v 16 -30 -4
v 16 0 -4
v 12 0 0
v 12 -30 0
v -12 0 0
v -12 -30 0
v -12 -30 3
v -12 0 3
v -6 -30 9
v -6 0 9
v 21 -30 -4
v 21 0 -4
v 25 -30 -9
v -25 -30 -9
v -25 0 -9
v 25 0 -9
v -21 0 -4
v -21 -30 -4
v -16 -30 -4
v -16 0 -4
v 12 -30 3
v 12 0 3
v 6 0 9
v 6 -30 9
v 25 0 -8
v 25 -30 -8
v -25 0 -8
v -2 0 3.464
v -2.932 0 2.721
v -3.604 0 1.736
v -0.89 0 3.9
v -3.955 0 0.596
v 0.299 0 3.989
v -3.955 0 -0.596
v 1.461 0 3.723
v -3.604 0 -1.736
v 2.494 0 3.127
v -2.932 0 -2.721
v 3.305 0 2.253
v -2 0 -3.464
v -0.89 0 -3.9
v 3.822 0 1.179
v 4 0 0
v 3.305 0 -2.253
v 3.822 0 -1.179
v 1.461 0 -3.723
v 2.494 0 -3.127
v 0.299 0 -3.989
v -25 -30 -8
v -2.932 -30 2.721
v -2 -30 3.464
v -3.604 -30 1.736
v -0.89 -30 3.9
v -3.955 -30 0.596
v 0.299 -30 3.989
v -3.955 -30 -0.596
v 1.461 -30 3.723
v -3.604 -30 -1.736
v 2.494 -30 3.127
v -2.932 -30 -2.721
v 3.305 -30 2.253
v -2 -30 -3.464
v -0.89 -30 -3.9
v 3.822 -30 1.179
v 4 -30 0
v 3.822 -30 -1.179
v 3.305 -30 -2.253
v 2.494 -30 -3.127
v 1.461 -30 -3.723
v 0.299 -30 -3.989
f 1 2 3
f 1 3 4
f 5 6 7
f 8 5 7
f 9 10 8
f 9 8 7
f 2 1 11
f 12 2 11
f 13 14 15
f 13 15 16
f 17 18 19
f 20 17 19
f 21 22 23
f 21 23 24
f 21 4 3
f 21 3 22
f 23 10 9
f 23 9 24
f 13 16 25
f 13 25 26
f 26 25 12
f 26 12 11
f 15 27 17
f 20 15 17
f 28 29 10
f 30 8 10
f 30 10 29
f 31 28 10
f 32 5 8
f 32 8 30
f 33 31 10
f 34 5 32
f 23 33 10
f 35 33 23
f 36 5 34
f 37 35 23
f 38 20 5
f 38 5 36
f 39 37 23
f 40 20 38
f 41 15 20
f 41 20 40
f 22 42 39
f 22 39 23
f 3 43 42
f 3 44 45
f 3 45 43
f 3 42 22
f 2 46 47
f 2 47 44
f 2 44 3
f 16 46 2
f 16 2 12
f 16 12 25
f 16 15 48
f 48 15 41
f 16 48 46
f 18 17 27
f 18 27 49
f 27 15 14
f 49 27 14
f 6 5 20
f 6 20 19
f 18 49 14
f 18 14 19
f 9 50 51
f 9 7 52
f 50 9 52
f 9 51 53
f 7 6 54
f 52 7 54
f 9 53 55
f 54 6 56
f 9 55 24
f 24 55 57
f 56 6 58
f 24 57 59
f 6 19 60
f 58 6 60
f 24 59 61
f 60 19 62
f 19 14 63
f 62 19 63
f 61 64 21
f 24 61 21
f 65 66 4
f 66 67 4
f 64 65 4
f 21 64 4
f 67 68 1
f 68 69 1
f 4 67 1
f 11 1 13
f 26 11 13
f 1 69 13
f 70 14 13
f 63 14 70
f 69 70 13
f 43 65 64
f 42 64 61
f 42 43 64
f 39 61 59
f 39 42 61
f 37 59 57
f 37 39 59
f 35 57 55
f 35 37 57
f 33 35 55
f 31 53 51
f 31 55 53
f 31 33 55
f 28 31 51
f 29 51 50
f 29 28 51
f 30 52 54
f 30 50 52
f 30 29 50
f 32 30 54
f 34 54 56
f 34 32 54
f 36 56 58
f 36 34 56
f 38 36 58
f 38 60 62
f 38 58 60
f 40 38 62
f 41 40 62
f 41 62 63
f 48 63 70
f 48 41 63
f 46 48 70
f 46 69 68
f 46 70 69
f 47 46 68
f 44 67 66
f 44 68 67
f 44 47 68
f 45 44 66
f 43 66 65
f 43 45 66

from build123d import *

# Parameters (mm, degrees)
SKETCH011_W                                = 24
SKETCH011_H                                = 18
SKETCH011_R                                = 4
PAD001007004004002003004004002012002_DEPTH = 30
CHAMFER_SIZE                               = 6
SKETCH012_W                                = 50
SKETCH012_H                                = 30
PAD001007004004002003004004002012003_DEPTH = 5
CHAMFER001_SIZE                            = 4


with BuildPart() as part:
    # Sketch011 → Pad001007004004002003004004002012002 (new body)
    with BuildSketch(Plane.XZ):
        Rectangle(SKETCH011_W, SKETCH011_H)
        Circle(SKETCH011_R, mode=Mode.SUBTRACT)
    extrude(amount=PAD001007004004002003004004002012002_DEPTH)

    # Chamfer
    chamfer_edges = [part.edges().sort_by_distance(p)[0] for p in [
        (12, -15, 9),
        (-12, -15, 9),
    ]]
    chamfer(chamfer_edges, length=CHAMFER_SIZE)

    # Sketch012 → Pad001007004004002003004004002012003 (new body)
    with BuildSketch(Plane(origin=(0, 0, -9), x_dir=(1, 0, 0), z_dir=(0, 0, -1))):
        with Locations((0, 15)):
            Rectangle(SKETCH012_W, SKETCH012_H)
    extrude(amount=-PAD001007004004002003004004002012003_DEPTH)

    # Chamfer001
    chamfer001_edges = [part.edges().sort_by_distance(p)[0] for p in [
        (12, -15, -4),
        (-12, -15, -4),
        (-25, -15, -4),
        (25, -15, -4),
    ]]
    chamfer(chamfer001_edges, length=CHAMFER001_SIZE)


solid = part.part
